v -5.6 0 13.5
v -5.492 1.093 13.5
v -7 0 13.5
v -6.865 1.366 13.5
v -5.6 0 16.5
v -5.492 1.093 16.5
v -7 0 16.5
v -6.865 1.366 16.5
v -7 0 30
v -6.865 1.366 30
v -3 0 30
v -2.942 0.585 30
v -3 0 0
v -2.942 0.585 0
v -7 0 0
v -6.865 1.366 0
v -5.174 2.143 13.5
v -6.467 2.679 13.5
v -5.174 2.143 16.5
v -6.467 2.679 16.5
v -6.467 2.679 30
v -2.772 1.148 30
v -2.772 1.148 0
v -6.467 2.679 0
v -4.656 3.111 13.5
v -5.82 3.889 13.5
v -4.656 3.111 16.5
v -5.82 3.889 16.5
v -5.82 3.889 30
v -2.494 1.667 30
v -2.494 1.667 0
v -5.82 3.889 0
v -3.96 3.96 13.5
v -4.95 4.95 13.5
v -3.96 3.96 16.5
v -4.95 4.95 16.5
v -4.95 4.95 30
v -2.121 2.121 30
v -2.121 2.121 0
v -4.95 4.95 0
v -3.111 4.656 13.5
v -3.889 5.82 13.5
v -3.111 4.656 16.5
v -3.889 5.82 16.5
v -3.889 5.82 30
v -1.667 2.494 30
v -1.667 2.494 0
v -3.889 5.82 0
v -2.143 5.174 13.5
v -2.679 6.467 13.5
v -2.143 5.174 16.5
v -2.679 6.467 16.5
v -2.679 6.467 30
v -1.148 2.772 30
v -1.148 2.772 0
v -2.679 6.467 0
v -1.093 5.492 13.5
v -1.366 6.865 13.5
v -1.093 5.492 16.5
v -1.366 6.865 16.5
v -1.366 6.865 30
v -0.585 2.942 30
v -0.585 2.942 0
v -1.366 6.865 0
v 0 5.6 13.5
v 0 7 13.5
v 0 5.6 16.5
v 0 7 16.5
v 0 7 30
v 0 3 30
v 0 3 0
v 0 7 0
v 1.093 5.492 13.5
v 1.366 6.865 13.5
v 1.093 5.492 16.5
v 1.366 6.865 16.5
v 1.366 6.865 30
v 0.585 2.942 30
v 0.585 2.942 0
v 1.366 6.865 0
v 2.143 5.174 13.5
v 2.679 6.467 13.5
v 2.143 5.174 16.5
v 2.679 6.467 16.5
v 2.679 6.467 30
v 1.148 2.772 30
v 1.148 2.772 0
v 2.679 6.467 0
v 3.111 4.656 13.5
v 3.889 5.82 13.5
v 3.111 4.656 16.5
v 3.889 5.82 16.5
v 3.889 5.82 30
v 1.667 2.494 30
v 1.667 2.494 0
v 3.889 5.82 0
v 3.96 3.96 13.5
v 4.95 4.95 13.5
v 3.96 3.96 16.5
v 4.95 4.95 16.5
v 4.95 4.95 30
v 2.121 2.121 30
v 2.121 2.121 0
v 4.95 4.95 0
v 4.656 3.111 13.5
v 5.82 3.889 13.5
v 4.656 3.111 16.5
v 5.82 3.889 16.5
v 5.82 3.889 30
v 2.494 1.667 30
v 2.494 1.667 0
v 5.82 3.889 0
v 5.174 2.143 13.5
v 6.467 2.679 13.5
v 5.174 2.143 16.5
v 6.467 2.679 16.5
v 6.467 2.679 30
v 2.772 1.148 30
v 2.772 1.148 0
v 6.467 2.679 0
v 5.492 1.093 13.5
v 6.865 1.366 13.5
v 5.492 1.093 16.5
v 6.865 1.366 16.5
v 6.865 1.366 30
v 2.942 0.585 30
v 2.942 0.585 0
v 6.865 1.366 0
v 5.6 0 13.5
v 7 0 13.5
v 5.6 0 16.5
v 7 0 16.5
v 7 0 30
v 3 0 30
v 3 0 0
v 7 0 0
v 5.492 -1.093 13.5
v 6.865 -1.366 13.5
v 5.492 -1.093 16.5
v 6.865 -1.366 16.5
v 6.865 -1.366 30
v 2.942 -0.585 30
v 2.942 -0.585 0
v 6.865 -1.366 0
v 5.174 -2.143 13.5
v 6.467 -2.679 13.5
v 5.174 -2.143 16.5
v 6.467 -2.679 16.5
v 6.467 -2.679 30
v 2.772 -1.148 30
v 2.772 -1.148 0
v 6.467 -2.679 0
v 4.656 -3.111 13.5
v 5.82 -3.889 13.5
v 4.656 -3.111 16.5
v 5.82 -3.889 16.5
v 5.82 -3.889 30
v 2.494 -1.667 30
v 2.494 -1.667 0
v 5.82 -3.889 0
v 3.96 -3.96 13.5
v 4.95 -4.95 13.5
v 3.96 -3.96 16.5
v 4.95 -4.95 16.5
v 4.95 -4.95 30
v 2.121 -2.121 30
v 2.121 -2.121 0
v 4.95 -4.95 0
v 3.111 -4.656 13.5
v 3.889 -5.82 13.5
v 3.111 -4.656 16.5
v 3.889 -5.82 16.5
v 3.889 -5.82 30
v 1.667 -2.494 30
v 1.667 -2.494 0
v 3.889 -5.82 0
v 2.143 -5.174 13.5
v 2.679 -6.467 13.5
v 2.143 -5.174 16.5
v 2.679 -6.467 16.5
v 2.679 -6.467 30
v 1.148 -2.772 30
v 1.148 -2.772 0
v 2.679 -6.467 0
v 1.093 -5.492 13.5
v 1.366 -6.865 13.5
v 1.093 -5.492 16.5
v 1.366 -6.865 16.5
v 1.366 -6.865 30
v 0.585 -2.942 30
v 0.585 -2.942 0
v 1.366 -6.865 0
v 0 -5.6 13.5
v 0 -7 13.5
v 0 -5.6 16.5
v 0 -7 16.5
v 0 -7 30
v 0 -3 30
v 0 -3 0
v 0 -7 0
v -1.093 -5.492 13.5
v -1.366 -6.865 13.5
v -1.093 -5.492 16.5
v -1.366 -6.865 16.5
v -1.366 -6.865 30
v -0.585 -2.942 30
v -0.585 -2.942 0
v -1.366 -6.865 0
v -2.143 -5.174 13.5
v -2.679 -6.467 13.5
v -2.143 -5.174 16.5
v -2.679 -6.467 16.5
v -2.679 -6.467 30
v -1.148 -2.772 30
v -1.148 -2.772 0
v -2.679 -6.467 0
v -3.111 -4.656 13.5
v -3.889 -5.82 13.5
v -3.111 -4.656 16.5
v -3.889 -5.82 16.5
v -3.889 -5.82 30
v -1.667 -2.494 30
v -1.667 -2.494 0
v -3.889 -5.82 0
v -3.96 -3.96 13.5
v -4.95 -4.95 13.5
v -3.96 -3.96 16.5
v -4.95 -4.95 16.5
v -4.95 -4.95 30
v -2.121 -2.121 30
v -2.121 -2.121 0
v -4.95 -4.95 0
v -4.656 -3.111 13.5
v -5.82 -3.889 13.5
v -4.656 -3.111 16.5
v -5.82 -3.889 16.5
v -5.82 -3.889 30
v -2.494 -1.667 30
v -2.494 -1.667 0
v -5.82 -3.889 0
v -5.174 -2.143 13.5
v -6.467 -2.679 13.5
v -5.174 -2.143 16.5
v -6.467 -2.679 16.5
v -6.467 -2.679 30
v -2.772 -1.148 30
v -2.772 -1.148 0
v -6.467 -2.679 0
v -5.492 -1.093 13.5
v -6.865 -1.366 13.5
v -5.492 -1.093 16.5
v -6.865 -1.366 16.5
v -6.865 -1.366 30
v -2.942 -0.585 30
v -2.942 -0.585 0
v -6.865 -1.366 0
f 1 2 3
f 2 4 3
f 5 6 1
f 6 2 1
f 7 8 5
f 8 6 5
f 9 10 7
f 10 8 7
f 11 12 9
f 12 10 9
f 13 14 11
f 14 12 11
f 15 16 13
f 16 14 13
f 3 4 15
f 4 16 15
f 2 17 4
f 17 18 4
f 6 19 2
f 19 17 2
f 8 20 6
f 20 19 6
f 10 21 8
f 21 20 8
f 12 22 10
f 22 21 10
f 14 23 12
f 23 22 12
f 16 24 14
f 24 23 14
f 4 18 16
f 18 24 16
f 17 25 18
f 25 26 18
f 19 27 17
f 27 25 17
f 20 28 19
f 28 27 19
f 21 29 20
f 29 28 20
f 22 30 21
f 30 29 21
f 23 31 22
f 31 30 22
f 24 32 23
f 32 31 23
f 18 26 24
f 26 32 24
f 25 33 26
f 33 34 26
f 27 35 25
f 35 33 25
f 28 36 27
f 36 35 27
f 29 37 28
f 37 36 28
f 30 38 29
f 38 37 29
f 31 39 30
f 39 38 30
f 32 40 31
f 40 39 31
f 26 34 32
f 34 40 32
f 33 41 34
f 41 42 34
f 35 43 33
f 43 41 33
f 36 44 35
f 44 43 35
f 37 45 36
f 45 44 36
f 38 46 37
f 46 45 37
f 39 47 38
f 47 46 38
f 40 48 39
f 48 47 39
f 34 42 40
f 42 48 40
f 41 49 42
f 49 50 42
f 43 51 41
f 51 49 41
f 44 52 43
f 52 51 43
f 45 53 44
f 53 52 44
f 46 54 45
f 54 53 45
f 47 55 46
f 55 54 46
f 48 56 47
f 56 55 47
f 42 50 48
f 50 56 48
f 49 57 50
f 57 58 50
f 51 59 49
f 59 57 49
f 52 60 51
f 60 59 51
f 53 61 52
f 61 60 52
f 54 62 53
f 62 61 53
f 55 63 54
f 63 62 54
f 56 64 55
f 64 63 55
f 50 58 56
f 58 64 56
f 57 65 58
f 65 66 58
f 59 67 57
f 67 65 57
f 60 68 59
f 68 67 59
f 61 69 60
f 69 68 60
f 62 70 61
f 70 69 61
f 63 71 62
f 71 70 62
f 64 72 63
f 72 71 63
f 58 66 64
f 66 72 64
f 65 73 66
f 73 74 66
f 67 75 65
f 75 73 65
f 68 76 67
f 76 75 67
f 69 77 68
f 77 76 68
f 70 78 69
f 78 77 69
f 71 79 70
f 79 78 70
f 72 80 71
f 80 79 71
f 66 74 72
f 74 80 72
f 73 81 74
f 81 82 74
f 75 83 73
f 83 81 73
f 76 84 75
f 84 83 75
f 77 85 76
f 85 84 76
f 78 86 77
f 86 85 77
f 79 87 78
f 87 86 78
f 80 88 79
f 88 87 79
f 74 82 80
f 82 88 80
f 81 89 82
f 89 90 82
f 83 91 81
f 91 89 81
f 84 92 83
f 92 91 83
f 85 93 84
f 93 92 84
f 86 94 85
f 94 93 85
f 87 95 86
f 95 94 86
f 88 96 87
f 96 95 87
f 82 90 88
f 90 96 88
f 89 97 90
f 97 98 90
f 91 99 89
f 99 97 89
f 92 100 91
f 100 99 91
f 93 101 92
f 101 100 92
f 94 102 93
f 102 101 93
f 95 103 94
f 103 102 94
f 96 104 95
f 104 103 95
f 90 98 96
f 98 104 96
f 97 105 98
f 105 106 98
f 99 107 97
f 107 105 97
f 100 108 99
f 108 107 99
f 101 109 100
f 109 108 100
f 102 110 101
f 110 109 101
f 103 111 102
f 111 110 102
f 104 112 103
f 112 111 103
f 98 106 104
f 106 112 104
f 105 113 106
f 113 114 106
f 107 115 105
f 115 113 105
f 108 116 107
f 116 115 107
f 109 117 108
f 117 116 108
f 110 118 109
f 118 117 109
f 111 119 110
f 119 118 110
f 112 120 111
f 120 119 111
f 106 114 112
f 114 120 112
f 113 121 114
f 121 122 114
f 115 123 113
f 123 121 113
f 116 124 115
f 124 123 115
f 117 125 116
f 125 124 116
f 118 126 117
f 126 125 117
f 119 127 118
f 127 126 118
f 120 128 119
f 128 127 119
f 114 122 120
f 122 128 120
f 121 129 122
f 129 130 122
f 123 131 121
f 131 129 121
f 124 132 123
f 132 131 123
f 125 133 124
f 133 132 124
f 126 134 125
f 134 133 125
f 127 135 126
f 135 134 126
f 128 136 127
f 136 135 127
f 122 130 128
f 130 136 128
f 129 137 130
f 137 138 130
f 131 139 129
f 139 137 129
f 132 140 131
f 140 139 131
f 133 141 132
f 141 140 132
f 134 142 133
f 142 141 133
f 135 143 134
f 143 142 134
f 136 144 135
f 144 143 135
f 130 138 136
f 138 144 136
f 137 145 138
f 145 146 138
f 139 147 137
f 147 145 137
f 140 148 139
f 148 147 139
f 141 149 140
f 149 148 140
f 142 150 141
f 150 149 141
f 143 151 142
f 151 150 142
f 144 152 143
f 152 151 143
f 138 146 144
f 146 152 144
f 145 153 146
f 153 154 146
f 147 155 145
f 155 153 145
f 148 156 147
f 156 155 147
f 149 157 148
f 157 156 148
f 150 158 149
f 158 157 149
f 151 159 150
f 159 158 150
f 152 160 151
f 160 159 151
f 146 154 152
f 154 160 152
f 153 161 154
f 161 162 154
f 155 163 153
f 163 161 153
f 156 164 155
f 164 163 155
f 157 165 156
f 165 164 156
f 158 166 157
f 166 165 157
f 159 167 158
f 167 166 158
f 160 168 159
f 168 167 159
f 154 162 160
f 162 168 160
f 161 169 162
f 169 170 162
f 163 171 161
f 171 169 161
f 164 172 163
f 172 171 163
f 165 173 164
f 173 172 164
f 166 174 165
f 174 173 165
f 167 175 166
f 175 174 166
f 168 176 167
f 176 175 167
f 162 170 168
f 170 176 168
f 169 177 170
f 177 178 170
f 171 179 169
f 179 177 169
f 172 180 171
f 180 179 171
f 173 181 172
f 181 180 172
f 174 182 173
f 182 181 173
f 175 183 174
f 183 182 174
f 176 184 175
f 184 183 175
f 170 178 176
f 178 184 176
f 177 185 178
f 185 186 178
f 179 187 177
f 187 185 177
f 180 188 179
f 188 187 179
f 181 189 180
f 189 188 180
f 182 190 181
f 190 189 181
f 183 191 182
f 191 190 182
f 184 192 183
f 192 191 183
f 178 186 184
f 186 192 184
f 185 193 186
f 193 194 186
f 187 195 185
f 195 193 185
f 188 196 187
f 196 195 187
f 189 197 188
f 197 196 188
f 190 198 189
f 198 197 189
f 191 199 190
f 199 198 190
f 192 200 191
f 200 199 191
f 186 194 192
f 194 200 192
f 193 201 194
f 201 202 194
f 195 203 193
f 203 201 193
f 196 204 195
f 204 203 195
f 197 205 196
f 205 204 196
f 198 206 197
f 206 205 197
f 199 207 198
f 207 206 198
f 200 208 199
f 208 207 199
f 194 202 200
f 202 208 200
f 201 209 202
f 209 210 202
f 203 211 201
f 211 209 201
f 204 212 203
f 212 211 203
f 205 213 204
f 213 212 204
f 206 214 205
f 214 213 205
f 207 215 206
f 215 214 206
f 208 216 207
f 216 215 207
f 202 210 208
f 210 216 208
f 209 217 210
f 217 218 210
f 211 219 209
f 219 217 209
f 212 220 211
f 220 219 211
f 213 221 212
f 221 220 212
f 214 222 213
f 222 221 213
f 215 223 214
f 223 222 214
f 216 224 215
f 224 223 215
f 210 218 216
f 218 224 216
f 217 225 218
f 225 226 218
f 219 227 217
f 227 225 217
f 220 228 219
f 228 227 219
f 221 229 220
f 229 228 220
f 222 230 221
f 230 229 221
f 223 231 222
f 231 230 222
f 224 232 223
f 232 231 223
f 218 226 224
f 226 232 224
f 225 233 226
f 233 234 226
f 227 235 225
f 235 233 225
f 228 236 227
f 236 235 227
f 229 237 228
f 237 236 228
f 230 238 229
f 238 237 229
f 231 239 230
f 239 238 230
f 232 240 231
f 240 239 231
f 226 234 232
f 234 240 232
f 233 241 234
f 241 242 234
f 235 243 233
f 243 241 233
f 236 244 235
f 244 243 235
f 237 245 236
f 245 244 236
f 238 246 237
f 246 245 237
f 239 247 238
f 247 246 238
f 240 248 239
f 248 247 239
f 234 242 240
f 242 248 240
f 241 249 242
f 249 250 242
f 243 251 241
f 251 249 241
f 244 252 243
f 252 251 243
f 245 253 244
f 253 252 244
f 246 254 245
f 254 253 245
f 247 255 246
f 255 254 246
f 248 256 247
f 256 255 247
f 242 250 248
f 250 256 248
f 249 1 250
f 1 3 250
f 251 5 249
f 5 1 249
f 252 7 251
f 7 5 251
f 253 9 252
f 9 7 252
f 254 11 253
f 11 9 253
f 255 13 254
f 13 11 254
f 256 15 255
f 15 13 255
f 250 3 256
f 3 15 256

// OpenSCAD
$fn = 32;

// ----------------------------------------------------------------------
// Grooved revolve: plain_grooves, bore R3
// ----------------------------------------------------------------------

// --- parameters (mm) ---
bore_r = 3;               // bore radius
outer_r = 7;              // outer radius of the body
total_h = 30;             // overall height, Z
wall = 4;                 // radial wall thickness
groove_w = 3;             // groove width
groove_d = 1.4;           // groove depth
grooves = 1;              // number of outer grooves

bbox_x = 2 * outer_r;  // full diameter
bore_d = 2 * bore_r;  // bore diameter
body_d = 2 * outer_r;  // body diameter
revolve_angle = 360;  // full turn around the Z axis

profile = [[3, 0], [7, 0], [7, 13.5], [5.6, 13.5], [5.6, 16.5], [7, 16.5], [7, 30], [3, 30]];  // primary outline, 8 points, counter clockwise

// --- the one profile operation ---
rotate_extrude(angle = revolve_angle) polygon(points = profile);
